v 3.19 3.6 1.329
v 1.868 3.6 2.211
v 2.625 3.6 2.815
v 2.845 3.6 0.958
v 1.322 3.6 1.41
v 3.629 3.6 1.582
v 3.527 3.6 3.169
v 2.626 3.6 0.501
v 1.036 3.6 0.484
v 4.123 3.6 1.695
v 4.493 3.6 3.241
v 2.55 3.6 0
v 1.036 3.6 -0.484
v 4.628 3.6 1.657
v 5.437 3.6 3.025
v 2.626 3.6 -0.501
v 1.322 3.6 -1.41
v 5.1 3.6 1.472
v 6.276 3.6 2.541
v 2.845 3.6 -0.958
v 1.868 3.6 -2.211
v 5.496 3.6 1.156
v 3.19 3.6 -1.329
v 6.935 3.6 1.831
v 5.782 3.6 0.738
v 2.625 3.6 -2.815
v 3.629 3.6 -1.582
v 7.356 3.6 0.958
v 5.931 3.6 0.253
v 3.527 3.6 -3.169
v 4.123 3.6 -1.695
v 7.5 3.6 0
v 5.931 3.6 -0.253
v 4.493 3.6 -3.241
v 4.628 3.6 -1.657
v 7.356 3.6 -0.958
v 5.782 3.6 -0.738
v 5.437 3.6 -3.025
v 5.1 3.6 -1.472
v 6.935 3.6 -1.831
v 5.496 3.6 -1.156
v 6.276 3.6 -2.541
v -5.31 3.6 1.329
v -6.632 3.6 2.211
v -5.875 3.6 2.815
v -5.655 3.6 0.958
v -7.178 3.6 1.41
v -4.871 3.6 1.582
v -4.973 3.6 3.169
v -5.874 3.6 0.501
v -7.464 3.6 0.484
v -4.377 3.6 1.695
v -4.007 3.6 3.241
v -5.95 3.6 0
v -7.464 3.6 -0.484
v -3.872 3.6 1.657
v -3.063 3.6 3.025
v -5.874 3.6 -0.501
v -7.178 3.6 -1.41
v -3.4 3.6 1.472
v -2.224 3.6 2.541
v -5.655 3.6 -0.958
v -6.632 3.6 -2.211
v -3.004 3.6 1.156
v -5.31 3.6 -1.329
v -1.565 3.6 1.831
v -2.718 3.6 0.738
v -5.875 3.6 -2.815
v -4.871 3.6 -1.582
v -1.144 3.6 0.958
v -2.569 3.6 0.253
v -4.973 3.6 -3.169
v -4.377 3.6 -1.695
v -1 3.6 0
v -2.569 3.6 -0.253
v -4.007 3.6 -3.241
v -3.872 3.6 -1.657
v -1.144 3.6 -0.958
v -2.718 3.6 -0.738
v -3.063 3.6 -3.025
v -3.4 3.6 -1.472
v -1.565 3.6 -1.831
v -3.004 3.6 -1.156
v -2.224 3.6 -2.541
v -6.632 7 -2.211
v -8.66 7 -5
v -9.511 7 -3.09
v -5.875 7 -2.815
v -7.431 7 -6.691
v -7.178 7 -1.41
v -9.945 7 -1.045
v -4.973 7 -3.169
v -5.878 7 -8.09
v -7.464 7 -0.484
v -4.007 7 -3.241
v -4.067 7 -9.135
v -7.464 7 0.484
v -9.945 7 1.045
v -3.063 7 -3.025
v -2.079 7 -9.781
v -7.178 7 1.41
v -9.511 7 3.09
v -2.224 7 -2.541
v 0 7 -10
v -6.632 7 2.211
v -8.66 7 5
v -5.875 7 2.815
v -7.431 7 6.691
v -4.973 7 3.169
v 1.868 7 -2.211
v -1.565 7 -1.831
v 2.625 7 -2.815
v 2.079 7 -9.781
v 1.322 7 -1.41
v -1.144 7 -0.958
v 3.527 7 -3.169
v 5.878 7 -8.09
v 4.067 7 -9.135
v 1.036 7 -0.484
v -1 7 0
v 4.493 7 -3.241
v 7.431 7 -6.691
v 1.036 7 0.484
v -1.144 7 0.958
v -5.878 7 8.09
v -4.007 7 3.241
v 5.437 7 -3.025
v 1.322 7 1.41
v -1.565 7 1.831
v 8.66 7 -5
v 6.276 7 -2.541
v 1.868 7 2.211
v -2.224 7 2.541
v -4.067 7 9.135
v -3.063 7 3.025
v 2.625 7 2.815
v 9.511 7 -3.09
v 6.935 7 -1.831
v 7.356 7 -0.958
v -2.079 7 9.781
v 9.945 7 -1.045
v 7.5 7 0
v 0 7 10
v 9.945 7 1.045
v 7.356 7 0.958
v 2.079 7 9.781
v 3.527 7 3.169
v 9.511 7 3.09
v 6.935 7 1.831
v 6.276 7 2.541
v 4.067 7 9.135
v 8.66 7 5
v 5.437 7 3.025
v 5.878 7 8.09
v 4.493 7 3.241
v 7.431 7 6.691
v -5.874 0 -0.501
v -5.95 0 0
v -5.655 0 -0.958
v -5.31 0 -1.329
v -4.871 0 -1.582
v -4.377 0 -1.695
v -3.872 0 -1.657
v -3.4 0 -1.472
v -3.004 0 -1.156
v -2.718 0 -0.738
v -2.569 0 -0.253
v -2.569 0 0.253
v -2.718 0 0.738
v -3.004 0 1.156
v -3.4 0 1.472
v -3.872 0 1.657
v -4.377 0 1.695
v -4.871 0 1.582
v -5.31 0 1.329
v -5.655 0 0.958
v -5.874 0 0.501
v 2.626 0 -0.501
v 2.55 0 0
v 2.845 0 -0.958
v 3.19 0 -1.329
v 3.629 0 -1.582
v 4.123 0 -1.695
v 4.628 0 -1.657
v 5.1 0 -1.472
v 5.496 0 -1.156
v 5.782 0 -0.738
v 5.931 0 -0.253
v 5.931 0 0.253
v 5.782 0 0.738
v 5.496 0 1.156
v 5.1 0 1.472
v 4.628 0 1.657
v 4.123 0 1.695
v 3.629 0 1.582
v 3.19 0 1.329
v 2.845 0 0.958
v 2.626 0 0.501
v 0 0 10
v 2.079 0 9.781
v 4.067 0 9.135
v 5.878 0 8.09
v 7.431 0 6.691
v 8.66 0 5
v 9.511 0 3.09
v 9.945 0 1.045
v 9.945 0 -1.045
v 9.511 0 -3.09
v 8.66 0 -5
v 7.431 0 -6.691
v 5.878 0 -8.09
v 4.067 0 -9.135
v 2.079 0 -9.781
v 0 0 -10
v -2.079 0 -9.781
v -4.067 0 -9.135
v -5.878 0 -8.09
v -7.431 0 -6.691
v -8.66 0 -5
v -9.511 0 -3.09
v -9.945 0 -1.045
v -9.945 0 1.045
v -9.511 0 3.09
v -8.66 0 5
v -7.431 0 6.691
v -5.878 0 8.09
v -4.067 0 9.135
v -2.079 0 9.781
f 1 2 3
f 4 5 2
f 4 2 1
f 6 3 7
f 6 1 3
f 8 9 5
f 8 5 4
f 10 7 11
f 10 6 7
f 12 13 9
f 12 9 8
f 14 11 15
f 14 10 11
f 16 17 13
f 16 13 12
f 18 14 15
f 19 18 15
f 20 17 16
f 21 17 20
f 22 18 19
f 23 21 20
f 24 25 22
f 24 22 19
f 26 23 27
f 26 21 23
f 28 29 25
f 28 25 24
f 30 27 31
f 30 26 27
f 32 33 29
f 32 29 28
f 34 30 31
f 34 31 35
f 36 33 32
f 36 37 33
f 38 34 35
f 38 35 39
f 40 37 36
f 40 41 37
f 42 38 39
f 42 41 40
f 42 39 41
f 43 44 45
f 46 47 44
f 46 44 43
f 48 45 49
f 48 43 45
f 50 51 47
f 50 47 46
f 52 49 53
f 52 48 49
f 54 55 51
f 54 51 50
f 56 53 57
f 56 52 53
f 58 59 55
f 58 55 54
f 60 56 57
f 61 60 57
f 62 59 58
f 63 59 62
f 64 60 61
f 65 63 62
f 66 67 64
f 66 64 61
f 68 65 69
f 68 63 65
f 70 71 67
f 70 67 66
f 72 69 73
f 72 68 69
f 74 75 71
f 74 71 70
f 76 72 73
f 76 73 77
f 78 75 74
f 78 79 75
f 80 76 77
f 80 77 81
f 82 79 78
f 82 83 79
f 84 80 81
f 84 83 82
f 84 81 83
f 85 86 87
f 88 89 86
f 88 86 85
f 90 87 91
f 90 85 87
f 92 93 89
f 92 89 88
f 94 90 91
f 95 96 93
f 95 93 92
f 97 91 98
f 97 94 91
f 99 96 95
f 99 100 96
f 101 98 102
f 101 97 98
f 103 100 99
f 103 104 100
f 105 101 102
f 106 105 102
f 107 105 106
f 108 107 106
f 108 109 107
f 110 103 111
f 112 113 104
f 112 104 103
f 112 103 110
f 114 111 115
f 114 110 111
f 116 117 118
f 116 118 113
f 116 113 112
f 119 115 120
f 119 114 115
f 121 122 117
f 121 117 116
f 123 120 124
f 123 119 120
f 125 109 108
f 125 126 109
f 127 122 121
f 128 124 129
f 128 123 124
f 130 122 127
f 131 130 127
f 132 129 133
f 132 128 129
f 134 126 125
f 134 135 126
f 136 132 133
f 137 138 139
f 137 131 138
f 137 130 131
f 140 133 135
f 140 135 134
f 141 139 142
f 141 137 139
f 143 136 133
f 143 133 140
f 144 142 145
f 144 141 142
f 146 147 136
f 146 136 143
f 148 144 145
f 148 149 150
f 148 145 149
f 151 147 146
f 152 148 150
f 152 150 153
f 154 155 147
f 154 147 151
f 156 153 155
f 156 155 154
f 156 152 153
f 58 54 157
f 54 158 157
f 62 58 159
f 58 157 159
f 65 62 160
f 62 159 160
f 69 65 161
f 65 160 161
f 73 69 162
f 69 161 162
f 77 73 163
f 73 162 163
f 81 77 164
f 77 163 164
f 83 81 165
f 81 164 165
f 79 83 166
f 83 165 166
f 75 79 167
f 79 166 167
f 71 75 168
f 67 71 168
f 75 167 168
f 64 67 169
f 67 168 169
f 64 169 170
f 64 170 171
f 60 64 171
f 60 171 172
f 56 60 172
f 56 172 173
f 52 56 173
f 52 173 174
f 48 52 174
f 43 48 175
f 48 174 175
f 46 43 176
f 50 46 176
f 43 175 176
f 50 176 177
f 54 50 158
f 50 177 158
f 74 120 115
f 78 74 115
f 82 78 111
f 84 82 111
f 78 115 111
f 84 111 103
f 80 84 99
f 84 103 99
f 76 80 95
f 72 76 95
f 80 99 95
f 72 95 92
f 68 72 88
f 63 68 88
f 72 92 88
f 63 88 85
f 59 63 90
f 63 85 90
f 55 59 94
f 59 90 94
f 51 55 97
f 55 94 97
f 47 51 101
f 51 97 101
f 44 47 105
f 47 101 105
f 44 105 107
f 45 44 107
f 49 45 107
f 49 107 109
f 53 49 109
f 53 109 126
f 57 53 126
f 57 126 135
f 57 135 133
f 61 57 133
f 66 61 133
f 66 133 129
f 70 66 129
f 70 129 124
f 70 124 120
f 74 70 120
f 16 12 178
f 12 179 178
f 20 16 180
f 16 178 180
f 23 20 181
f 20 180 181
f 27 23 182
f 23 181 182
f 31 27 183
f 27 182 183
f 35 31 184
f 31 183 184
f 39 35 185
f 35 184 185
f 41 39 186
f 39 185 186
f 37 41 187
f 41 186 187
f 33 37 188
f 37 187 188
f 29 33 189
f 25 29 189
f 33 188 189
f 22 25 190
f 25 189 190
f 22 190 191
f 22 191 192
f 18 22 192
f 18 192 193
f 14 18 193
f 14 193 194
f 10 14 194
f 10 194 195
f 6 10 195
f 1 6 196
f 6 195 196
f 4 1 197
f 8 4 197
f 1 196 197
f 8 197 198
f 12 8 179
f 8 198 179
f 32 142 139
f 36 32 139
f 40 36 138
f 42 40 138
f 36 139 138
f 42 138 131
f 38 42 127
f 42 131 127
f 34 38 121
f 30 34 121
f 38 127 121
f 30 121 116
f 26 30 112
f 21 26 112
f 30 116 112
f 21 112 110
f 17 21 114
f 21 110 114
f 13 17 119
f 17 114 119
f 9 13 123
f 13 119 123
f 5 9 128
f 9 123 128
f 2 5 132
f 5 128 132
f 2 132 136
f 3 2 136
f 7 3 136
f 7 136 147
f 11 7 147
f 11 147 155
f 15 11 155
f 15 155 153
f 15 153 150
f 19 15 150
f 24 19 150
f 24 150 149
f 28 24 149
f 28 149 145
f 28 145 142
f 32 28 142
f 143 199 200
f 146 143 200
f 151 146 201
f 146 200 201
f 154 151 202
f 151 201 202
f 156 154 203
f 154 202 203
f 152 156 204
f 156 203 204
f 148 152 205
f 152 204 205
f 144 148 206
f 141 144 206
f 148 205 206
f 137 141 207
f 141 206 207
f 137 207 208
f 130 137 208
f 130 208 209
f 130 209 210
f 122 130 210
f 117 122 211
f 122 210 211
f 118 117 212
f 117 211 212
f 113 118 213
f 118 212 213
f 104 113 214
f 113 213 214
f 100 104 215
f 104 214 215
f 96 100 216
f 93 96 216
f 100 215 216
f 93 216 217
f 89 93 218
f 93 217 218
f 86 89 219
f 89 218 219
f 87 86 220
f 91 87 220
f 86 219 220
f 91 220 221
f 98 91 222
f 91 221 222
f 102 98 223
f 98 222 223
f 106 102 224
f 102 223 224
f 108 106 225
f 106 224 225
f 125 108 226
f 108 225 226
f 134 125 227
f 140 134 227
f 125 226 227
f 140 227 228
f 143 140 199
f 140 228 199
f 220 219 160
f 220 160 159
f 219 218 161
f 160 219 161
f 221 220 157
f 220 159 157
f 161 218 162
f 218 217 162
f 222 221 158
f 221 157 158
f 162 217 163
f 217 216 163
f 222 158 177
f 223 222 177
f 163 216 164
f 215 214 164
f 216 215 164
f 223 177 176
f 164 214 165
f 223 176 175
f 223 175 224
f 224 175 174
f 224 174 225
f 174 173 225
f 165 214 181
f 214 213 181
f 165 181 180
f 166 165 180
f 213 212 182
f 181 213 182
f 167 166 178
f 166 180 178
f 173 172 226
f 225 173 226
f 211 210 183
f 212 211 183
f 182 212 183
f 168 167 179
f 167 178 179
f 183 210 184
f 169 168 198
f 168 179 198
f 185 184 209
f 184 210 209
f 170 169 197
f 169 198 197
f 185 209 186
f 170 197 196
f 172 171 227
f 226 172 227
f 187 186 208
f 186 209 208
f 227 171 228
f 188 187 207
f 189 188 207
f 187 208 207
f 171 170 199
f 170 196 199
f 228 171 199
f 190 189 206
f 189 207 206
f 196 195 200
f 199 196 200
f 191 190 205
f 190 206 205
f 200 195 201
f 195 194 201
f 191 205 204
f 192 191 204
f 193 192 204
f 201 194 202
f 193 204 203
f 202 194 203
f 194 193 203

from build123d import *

# Parameters (mm, degrees)
SKIZZE1_R                                            = 10
AUFSATZ_LINEAR_AUSTRAGEN1_DEPTH                      = 7
STIRNSENKUNG_F_R_M3_ZYLINDERSCHRAUBE_MIT_D           = 3.4
STIRNSENKUNG_F_R_M3_ZYLINDERSCHRAUBE_MIT_CBORE_D     = 6.5
STIRNSENKUNG_F_R_M3_ZYLINDERSCHRAUBE_MIT_CBORE_DEPTH = 3.4


with BuildPart() as part:
    # Skizze1 → Aufsatz-Linear austragen1 (new body)
    with BuildSketch(Plane(origin=(0, 0, 0), x_dir=(1, 0, 0), z_dir=(0, 1, 0))):
        with Locations(Location((0, 0, 0), (0, 0, 270))):
            Circle(SKIZZE1_R)
    extrude(amount=AUFSATZ_LINEAR_AUSTRAGEN1_DEPTH)

    # Stirnsenkung für M3 Zylinderschraube mit Innensechskant1 (through all)
    with Locations(Plane(origin=(0, 7, 0), x_dir=(1, 0, 0), z_dir=(0, 1, 0))):
        with Locations((4.25, 0), (-4.25, 0)):
            CounterBoreHole(STIRNSENKUNG_F_R_M3_ZYLINDERSCHRAUBE_MIT_D / 2, STIRNSENKUNG_F_R_M3_ZYLINDERSCHRAUBE_MIT_CBORE_D / 2, STIRNSENKUNG_F_R_M3_ZYLINDERSCHRAUBE_MIT_CBORE_DEPTH)


solid = part.part
